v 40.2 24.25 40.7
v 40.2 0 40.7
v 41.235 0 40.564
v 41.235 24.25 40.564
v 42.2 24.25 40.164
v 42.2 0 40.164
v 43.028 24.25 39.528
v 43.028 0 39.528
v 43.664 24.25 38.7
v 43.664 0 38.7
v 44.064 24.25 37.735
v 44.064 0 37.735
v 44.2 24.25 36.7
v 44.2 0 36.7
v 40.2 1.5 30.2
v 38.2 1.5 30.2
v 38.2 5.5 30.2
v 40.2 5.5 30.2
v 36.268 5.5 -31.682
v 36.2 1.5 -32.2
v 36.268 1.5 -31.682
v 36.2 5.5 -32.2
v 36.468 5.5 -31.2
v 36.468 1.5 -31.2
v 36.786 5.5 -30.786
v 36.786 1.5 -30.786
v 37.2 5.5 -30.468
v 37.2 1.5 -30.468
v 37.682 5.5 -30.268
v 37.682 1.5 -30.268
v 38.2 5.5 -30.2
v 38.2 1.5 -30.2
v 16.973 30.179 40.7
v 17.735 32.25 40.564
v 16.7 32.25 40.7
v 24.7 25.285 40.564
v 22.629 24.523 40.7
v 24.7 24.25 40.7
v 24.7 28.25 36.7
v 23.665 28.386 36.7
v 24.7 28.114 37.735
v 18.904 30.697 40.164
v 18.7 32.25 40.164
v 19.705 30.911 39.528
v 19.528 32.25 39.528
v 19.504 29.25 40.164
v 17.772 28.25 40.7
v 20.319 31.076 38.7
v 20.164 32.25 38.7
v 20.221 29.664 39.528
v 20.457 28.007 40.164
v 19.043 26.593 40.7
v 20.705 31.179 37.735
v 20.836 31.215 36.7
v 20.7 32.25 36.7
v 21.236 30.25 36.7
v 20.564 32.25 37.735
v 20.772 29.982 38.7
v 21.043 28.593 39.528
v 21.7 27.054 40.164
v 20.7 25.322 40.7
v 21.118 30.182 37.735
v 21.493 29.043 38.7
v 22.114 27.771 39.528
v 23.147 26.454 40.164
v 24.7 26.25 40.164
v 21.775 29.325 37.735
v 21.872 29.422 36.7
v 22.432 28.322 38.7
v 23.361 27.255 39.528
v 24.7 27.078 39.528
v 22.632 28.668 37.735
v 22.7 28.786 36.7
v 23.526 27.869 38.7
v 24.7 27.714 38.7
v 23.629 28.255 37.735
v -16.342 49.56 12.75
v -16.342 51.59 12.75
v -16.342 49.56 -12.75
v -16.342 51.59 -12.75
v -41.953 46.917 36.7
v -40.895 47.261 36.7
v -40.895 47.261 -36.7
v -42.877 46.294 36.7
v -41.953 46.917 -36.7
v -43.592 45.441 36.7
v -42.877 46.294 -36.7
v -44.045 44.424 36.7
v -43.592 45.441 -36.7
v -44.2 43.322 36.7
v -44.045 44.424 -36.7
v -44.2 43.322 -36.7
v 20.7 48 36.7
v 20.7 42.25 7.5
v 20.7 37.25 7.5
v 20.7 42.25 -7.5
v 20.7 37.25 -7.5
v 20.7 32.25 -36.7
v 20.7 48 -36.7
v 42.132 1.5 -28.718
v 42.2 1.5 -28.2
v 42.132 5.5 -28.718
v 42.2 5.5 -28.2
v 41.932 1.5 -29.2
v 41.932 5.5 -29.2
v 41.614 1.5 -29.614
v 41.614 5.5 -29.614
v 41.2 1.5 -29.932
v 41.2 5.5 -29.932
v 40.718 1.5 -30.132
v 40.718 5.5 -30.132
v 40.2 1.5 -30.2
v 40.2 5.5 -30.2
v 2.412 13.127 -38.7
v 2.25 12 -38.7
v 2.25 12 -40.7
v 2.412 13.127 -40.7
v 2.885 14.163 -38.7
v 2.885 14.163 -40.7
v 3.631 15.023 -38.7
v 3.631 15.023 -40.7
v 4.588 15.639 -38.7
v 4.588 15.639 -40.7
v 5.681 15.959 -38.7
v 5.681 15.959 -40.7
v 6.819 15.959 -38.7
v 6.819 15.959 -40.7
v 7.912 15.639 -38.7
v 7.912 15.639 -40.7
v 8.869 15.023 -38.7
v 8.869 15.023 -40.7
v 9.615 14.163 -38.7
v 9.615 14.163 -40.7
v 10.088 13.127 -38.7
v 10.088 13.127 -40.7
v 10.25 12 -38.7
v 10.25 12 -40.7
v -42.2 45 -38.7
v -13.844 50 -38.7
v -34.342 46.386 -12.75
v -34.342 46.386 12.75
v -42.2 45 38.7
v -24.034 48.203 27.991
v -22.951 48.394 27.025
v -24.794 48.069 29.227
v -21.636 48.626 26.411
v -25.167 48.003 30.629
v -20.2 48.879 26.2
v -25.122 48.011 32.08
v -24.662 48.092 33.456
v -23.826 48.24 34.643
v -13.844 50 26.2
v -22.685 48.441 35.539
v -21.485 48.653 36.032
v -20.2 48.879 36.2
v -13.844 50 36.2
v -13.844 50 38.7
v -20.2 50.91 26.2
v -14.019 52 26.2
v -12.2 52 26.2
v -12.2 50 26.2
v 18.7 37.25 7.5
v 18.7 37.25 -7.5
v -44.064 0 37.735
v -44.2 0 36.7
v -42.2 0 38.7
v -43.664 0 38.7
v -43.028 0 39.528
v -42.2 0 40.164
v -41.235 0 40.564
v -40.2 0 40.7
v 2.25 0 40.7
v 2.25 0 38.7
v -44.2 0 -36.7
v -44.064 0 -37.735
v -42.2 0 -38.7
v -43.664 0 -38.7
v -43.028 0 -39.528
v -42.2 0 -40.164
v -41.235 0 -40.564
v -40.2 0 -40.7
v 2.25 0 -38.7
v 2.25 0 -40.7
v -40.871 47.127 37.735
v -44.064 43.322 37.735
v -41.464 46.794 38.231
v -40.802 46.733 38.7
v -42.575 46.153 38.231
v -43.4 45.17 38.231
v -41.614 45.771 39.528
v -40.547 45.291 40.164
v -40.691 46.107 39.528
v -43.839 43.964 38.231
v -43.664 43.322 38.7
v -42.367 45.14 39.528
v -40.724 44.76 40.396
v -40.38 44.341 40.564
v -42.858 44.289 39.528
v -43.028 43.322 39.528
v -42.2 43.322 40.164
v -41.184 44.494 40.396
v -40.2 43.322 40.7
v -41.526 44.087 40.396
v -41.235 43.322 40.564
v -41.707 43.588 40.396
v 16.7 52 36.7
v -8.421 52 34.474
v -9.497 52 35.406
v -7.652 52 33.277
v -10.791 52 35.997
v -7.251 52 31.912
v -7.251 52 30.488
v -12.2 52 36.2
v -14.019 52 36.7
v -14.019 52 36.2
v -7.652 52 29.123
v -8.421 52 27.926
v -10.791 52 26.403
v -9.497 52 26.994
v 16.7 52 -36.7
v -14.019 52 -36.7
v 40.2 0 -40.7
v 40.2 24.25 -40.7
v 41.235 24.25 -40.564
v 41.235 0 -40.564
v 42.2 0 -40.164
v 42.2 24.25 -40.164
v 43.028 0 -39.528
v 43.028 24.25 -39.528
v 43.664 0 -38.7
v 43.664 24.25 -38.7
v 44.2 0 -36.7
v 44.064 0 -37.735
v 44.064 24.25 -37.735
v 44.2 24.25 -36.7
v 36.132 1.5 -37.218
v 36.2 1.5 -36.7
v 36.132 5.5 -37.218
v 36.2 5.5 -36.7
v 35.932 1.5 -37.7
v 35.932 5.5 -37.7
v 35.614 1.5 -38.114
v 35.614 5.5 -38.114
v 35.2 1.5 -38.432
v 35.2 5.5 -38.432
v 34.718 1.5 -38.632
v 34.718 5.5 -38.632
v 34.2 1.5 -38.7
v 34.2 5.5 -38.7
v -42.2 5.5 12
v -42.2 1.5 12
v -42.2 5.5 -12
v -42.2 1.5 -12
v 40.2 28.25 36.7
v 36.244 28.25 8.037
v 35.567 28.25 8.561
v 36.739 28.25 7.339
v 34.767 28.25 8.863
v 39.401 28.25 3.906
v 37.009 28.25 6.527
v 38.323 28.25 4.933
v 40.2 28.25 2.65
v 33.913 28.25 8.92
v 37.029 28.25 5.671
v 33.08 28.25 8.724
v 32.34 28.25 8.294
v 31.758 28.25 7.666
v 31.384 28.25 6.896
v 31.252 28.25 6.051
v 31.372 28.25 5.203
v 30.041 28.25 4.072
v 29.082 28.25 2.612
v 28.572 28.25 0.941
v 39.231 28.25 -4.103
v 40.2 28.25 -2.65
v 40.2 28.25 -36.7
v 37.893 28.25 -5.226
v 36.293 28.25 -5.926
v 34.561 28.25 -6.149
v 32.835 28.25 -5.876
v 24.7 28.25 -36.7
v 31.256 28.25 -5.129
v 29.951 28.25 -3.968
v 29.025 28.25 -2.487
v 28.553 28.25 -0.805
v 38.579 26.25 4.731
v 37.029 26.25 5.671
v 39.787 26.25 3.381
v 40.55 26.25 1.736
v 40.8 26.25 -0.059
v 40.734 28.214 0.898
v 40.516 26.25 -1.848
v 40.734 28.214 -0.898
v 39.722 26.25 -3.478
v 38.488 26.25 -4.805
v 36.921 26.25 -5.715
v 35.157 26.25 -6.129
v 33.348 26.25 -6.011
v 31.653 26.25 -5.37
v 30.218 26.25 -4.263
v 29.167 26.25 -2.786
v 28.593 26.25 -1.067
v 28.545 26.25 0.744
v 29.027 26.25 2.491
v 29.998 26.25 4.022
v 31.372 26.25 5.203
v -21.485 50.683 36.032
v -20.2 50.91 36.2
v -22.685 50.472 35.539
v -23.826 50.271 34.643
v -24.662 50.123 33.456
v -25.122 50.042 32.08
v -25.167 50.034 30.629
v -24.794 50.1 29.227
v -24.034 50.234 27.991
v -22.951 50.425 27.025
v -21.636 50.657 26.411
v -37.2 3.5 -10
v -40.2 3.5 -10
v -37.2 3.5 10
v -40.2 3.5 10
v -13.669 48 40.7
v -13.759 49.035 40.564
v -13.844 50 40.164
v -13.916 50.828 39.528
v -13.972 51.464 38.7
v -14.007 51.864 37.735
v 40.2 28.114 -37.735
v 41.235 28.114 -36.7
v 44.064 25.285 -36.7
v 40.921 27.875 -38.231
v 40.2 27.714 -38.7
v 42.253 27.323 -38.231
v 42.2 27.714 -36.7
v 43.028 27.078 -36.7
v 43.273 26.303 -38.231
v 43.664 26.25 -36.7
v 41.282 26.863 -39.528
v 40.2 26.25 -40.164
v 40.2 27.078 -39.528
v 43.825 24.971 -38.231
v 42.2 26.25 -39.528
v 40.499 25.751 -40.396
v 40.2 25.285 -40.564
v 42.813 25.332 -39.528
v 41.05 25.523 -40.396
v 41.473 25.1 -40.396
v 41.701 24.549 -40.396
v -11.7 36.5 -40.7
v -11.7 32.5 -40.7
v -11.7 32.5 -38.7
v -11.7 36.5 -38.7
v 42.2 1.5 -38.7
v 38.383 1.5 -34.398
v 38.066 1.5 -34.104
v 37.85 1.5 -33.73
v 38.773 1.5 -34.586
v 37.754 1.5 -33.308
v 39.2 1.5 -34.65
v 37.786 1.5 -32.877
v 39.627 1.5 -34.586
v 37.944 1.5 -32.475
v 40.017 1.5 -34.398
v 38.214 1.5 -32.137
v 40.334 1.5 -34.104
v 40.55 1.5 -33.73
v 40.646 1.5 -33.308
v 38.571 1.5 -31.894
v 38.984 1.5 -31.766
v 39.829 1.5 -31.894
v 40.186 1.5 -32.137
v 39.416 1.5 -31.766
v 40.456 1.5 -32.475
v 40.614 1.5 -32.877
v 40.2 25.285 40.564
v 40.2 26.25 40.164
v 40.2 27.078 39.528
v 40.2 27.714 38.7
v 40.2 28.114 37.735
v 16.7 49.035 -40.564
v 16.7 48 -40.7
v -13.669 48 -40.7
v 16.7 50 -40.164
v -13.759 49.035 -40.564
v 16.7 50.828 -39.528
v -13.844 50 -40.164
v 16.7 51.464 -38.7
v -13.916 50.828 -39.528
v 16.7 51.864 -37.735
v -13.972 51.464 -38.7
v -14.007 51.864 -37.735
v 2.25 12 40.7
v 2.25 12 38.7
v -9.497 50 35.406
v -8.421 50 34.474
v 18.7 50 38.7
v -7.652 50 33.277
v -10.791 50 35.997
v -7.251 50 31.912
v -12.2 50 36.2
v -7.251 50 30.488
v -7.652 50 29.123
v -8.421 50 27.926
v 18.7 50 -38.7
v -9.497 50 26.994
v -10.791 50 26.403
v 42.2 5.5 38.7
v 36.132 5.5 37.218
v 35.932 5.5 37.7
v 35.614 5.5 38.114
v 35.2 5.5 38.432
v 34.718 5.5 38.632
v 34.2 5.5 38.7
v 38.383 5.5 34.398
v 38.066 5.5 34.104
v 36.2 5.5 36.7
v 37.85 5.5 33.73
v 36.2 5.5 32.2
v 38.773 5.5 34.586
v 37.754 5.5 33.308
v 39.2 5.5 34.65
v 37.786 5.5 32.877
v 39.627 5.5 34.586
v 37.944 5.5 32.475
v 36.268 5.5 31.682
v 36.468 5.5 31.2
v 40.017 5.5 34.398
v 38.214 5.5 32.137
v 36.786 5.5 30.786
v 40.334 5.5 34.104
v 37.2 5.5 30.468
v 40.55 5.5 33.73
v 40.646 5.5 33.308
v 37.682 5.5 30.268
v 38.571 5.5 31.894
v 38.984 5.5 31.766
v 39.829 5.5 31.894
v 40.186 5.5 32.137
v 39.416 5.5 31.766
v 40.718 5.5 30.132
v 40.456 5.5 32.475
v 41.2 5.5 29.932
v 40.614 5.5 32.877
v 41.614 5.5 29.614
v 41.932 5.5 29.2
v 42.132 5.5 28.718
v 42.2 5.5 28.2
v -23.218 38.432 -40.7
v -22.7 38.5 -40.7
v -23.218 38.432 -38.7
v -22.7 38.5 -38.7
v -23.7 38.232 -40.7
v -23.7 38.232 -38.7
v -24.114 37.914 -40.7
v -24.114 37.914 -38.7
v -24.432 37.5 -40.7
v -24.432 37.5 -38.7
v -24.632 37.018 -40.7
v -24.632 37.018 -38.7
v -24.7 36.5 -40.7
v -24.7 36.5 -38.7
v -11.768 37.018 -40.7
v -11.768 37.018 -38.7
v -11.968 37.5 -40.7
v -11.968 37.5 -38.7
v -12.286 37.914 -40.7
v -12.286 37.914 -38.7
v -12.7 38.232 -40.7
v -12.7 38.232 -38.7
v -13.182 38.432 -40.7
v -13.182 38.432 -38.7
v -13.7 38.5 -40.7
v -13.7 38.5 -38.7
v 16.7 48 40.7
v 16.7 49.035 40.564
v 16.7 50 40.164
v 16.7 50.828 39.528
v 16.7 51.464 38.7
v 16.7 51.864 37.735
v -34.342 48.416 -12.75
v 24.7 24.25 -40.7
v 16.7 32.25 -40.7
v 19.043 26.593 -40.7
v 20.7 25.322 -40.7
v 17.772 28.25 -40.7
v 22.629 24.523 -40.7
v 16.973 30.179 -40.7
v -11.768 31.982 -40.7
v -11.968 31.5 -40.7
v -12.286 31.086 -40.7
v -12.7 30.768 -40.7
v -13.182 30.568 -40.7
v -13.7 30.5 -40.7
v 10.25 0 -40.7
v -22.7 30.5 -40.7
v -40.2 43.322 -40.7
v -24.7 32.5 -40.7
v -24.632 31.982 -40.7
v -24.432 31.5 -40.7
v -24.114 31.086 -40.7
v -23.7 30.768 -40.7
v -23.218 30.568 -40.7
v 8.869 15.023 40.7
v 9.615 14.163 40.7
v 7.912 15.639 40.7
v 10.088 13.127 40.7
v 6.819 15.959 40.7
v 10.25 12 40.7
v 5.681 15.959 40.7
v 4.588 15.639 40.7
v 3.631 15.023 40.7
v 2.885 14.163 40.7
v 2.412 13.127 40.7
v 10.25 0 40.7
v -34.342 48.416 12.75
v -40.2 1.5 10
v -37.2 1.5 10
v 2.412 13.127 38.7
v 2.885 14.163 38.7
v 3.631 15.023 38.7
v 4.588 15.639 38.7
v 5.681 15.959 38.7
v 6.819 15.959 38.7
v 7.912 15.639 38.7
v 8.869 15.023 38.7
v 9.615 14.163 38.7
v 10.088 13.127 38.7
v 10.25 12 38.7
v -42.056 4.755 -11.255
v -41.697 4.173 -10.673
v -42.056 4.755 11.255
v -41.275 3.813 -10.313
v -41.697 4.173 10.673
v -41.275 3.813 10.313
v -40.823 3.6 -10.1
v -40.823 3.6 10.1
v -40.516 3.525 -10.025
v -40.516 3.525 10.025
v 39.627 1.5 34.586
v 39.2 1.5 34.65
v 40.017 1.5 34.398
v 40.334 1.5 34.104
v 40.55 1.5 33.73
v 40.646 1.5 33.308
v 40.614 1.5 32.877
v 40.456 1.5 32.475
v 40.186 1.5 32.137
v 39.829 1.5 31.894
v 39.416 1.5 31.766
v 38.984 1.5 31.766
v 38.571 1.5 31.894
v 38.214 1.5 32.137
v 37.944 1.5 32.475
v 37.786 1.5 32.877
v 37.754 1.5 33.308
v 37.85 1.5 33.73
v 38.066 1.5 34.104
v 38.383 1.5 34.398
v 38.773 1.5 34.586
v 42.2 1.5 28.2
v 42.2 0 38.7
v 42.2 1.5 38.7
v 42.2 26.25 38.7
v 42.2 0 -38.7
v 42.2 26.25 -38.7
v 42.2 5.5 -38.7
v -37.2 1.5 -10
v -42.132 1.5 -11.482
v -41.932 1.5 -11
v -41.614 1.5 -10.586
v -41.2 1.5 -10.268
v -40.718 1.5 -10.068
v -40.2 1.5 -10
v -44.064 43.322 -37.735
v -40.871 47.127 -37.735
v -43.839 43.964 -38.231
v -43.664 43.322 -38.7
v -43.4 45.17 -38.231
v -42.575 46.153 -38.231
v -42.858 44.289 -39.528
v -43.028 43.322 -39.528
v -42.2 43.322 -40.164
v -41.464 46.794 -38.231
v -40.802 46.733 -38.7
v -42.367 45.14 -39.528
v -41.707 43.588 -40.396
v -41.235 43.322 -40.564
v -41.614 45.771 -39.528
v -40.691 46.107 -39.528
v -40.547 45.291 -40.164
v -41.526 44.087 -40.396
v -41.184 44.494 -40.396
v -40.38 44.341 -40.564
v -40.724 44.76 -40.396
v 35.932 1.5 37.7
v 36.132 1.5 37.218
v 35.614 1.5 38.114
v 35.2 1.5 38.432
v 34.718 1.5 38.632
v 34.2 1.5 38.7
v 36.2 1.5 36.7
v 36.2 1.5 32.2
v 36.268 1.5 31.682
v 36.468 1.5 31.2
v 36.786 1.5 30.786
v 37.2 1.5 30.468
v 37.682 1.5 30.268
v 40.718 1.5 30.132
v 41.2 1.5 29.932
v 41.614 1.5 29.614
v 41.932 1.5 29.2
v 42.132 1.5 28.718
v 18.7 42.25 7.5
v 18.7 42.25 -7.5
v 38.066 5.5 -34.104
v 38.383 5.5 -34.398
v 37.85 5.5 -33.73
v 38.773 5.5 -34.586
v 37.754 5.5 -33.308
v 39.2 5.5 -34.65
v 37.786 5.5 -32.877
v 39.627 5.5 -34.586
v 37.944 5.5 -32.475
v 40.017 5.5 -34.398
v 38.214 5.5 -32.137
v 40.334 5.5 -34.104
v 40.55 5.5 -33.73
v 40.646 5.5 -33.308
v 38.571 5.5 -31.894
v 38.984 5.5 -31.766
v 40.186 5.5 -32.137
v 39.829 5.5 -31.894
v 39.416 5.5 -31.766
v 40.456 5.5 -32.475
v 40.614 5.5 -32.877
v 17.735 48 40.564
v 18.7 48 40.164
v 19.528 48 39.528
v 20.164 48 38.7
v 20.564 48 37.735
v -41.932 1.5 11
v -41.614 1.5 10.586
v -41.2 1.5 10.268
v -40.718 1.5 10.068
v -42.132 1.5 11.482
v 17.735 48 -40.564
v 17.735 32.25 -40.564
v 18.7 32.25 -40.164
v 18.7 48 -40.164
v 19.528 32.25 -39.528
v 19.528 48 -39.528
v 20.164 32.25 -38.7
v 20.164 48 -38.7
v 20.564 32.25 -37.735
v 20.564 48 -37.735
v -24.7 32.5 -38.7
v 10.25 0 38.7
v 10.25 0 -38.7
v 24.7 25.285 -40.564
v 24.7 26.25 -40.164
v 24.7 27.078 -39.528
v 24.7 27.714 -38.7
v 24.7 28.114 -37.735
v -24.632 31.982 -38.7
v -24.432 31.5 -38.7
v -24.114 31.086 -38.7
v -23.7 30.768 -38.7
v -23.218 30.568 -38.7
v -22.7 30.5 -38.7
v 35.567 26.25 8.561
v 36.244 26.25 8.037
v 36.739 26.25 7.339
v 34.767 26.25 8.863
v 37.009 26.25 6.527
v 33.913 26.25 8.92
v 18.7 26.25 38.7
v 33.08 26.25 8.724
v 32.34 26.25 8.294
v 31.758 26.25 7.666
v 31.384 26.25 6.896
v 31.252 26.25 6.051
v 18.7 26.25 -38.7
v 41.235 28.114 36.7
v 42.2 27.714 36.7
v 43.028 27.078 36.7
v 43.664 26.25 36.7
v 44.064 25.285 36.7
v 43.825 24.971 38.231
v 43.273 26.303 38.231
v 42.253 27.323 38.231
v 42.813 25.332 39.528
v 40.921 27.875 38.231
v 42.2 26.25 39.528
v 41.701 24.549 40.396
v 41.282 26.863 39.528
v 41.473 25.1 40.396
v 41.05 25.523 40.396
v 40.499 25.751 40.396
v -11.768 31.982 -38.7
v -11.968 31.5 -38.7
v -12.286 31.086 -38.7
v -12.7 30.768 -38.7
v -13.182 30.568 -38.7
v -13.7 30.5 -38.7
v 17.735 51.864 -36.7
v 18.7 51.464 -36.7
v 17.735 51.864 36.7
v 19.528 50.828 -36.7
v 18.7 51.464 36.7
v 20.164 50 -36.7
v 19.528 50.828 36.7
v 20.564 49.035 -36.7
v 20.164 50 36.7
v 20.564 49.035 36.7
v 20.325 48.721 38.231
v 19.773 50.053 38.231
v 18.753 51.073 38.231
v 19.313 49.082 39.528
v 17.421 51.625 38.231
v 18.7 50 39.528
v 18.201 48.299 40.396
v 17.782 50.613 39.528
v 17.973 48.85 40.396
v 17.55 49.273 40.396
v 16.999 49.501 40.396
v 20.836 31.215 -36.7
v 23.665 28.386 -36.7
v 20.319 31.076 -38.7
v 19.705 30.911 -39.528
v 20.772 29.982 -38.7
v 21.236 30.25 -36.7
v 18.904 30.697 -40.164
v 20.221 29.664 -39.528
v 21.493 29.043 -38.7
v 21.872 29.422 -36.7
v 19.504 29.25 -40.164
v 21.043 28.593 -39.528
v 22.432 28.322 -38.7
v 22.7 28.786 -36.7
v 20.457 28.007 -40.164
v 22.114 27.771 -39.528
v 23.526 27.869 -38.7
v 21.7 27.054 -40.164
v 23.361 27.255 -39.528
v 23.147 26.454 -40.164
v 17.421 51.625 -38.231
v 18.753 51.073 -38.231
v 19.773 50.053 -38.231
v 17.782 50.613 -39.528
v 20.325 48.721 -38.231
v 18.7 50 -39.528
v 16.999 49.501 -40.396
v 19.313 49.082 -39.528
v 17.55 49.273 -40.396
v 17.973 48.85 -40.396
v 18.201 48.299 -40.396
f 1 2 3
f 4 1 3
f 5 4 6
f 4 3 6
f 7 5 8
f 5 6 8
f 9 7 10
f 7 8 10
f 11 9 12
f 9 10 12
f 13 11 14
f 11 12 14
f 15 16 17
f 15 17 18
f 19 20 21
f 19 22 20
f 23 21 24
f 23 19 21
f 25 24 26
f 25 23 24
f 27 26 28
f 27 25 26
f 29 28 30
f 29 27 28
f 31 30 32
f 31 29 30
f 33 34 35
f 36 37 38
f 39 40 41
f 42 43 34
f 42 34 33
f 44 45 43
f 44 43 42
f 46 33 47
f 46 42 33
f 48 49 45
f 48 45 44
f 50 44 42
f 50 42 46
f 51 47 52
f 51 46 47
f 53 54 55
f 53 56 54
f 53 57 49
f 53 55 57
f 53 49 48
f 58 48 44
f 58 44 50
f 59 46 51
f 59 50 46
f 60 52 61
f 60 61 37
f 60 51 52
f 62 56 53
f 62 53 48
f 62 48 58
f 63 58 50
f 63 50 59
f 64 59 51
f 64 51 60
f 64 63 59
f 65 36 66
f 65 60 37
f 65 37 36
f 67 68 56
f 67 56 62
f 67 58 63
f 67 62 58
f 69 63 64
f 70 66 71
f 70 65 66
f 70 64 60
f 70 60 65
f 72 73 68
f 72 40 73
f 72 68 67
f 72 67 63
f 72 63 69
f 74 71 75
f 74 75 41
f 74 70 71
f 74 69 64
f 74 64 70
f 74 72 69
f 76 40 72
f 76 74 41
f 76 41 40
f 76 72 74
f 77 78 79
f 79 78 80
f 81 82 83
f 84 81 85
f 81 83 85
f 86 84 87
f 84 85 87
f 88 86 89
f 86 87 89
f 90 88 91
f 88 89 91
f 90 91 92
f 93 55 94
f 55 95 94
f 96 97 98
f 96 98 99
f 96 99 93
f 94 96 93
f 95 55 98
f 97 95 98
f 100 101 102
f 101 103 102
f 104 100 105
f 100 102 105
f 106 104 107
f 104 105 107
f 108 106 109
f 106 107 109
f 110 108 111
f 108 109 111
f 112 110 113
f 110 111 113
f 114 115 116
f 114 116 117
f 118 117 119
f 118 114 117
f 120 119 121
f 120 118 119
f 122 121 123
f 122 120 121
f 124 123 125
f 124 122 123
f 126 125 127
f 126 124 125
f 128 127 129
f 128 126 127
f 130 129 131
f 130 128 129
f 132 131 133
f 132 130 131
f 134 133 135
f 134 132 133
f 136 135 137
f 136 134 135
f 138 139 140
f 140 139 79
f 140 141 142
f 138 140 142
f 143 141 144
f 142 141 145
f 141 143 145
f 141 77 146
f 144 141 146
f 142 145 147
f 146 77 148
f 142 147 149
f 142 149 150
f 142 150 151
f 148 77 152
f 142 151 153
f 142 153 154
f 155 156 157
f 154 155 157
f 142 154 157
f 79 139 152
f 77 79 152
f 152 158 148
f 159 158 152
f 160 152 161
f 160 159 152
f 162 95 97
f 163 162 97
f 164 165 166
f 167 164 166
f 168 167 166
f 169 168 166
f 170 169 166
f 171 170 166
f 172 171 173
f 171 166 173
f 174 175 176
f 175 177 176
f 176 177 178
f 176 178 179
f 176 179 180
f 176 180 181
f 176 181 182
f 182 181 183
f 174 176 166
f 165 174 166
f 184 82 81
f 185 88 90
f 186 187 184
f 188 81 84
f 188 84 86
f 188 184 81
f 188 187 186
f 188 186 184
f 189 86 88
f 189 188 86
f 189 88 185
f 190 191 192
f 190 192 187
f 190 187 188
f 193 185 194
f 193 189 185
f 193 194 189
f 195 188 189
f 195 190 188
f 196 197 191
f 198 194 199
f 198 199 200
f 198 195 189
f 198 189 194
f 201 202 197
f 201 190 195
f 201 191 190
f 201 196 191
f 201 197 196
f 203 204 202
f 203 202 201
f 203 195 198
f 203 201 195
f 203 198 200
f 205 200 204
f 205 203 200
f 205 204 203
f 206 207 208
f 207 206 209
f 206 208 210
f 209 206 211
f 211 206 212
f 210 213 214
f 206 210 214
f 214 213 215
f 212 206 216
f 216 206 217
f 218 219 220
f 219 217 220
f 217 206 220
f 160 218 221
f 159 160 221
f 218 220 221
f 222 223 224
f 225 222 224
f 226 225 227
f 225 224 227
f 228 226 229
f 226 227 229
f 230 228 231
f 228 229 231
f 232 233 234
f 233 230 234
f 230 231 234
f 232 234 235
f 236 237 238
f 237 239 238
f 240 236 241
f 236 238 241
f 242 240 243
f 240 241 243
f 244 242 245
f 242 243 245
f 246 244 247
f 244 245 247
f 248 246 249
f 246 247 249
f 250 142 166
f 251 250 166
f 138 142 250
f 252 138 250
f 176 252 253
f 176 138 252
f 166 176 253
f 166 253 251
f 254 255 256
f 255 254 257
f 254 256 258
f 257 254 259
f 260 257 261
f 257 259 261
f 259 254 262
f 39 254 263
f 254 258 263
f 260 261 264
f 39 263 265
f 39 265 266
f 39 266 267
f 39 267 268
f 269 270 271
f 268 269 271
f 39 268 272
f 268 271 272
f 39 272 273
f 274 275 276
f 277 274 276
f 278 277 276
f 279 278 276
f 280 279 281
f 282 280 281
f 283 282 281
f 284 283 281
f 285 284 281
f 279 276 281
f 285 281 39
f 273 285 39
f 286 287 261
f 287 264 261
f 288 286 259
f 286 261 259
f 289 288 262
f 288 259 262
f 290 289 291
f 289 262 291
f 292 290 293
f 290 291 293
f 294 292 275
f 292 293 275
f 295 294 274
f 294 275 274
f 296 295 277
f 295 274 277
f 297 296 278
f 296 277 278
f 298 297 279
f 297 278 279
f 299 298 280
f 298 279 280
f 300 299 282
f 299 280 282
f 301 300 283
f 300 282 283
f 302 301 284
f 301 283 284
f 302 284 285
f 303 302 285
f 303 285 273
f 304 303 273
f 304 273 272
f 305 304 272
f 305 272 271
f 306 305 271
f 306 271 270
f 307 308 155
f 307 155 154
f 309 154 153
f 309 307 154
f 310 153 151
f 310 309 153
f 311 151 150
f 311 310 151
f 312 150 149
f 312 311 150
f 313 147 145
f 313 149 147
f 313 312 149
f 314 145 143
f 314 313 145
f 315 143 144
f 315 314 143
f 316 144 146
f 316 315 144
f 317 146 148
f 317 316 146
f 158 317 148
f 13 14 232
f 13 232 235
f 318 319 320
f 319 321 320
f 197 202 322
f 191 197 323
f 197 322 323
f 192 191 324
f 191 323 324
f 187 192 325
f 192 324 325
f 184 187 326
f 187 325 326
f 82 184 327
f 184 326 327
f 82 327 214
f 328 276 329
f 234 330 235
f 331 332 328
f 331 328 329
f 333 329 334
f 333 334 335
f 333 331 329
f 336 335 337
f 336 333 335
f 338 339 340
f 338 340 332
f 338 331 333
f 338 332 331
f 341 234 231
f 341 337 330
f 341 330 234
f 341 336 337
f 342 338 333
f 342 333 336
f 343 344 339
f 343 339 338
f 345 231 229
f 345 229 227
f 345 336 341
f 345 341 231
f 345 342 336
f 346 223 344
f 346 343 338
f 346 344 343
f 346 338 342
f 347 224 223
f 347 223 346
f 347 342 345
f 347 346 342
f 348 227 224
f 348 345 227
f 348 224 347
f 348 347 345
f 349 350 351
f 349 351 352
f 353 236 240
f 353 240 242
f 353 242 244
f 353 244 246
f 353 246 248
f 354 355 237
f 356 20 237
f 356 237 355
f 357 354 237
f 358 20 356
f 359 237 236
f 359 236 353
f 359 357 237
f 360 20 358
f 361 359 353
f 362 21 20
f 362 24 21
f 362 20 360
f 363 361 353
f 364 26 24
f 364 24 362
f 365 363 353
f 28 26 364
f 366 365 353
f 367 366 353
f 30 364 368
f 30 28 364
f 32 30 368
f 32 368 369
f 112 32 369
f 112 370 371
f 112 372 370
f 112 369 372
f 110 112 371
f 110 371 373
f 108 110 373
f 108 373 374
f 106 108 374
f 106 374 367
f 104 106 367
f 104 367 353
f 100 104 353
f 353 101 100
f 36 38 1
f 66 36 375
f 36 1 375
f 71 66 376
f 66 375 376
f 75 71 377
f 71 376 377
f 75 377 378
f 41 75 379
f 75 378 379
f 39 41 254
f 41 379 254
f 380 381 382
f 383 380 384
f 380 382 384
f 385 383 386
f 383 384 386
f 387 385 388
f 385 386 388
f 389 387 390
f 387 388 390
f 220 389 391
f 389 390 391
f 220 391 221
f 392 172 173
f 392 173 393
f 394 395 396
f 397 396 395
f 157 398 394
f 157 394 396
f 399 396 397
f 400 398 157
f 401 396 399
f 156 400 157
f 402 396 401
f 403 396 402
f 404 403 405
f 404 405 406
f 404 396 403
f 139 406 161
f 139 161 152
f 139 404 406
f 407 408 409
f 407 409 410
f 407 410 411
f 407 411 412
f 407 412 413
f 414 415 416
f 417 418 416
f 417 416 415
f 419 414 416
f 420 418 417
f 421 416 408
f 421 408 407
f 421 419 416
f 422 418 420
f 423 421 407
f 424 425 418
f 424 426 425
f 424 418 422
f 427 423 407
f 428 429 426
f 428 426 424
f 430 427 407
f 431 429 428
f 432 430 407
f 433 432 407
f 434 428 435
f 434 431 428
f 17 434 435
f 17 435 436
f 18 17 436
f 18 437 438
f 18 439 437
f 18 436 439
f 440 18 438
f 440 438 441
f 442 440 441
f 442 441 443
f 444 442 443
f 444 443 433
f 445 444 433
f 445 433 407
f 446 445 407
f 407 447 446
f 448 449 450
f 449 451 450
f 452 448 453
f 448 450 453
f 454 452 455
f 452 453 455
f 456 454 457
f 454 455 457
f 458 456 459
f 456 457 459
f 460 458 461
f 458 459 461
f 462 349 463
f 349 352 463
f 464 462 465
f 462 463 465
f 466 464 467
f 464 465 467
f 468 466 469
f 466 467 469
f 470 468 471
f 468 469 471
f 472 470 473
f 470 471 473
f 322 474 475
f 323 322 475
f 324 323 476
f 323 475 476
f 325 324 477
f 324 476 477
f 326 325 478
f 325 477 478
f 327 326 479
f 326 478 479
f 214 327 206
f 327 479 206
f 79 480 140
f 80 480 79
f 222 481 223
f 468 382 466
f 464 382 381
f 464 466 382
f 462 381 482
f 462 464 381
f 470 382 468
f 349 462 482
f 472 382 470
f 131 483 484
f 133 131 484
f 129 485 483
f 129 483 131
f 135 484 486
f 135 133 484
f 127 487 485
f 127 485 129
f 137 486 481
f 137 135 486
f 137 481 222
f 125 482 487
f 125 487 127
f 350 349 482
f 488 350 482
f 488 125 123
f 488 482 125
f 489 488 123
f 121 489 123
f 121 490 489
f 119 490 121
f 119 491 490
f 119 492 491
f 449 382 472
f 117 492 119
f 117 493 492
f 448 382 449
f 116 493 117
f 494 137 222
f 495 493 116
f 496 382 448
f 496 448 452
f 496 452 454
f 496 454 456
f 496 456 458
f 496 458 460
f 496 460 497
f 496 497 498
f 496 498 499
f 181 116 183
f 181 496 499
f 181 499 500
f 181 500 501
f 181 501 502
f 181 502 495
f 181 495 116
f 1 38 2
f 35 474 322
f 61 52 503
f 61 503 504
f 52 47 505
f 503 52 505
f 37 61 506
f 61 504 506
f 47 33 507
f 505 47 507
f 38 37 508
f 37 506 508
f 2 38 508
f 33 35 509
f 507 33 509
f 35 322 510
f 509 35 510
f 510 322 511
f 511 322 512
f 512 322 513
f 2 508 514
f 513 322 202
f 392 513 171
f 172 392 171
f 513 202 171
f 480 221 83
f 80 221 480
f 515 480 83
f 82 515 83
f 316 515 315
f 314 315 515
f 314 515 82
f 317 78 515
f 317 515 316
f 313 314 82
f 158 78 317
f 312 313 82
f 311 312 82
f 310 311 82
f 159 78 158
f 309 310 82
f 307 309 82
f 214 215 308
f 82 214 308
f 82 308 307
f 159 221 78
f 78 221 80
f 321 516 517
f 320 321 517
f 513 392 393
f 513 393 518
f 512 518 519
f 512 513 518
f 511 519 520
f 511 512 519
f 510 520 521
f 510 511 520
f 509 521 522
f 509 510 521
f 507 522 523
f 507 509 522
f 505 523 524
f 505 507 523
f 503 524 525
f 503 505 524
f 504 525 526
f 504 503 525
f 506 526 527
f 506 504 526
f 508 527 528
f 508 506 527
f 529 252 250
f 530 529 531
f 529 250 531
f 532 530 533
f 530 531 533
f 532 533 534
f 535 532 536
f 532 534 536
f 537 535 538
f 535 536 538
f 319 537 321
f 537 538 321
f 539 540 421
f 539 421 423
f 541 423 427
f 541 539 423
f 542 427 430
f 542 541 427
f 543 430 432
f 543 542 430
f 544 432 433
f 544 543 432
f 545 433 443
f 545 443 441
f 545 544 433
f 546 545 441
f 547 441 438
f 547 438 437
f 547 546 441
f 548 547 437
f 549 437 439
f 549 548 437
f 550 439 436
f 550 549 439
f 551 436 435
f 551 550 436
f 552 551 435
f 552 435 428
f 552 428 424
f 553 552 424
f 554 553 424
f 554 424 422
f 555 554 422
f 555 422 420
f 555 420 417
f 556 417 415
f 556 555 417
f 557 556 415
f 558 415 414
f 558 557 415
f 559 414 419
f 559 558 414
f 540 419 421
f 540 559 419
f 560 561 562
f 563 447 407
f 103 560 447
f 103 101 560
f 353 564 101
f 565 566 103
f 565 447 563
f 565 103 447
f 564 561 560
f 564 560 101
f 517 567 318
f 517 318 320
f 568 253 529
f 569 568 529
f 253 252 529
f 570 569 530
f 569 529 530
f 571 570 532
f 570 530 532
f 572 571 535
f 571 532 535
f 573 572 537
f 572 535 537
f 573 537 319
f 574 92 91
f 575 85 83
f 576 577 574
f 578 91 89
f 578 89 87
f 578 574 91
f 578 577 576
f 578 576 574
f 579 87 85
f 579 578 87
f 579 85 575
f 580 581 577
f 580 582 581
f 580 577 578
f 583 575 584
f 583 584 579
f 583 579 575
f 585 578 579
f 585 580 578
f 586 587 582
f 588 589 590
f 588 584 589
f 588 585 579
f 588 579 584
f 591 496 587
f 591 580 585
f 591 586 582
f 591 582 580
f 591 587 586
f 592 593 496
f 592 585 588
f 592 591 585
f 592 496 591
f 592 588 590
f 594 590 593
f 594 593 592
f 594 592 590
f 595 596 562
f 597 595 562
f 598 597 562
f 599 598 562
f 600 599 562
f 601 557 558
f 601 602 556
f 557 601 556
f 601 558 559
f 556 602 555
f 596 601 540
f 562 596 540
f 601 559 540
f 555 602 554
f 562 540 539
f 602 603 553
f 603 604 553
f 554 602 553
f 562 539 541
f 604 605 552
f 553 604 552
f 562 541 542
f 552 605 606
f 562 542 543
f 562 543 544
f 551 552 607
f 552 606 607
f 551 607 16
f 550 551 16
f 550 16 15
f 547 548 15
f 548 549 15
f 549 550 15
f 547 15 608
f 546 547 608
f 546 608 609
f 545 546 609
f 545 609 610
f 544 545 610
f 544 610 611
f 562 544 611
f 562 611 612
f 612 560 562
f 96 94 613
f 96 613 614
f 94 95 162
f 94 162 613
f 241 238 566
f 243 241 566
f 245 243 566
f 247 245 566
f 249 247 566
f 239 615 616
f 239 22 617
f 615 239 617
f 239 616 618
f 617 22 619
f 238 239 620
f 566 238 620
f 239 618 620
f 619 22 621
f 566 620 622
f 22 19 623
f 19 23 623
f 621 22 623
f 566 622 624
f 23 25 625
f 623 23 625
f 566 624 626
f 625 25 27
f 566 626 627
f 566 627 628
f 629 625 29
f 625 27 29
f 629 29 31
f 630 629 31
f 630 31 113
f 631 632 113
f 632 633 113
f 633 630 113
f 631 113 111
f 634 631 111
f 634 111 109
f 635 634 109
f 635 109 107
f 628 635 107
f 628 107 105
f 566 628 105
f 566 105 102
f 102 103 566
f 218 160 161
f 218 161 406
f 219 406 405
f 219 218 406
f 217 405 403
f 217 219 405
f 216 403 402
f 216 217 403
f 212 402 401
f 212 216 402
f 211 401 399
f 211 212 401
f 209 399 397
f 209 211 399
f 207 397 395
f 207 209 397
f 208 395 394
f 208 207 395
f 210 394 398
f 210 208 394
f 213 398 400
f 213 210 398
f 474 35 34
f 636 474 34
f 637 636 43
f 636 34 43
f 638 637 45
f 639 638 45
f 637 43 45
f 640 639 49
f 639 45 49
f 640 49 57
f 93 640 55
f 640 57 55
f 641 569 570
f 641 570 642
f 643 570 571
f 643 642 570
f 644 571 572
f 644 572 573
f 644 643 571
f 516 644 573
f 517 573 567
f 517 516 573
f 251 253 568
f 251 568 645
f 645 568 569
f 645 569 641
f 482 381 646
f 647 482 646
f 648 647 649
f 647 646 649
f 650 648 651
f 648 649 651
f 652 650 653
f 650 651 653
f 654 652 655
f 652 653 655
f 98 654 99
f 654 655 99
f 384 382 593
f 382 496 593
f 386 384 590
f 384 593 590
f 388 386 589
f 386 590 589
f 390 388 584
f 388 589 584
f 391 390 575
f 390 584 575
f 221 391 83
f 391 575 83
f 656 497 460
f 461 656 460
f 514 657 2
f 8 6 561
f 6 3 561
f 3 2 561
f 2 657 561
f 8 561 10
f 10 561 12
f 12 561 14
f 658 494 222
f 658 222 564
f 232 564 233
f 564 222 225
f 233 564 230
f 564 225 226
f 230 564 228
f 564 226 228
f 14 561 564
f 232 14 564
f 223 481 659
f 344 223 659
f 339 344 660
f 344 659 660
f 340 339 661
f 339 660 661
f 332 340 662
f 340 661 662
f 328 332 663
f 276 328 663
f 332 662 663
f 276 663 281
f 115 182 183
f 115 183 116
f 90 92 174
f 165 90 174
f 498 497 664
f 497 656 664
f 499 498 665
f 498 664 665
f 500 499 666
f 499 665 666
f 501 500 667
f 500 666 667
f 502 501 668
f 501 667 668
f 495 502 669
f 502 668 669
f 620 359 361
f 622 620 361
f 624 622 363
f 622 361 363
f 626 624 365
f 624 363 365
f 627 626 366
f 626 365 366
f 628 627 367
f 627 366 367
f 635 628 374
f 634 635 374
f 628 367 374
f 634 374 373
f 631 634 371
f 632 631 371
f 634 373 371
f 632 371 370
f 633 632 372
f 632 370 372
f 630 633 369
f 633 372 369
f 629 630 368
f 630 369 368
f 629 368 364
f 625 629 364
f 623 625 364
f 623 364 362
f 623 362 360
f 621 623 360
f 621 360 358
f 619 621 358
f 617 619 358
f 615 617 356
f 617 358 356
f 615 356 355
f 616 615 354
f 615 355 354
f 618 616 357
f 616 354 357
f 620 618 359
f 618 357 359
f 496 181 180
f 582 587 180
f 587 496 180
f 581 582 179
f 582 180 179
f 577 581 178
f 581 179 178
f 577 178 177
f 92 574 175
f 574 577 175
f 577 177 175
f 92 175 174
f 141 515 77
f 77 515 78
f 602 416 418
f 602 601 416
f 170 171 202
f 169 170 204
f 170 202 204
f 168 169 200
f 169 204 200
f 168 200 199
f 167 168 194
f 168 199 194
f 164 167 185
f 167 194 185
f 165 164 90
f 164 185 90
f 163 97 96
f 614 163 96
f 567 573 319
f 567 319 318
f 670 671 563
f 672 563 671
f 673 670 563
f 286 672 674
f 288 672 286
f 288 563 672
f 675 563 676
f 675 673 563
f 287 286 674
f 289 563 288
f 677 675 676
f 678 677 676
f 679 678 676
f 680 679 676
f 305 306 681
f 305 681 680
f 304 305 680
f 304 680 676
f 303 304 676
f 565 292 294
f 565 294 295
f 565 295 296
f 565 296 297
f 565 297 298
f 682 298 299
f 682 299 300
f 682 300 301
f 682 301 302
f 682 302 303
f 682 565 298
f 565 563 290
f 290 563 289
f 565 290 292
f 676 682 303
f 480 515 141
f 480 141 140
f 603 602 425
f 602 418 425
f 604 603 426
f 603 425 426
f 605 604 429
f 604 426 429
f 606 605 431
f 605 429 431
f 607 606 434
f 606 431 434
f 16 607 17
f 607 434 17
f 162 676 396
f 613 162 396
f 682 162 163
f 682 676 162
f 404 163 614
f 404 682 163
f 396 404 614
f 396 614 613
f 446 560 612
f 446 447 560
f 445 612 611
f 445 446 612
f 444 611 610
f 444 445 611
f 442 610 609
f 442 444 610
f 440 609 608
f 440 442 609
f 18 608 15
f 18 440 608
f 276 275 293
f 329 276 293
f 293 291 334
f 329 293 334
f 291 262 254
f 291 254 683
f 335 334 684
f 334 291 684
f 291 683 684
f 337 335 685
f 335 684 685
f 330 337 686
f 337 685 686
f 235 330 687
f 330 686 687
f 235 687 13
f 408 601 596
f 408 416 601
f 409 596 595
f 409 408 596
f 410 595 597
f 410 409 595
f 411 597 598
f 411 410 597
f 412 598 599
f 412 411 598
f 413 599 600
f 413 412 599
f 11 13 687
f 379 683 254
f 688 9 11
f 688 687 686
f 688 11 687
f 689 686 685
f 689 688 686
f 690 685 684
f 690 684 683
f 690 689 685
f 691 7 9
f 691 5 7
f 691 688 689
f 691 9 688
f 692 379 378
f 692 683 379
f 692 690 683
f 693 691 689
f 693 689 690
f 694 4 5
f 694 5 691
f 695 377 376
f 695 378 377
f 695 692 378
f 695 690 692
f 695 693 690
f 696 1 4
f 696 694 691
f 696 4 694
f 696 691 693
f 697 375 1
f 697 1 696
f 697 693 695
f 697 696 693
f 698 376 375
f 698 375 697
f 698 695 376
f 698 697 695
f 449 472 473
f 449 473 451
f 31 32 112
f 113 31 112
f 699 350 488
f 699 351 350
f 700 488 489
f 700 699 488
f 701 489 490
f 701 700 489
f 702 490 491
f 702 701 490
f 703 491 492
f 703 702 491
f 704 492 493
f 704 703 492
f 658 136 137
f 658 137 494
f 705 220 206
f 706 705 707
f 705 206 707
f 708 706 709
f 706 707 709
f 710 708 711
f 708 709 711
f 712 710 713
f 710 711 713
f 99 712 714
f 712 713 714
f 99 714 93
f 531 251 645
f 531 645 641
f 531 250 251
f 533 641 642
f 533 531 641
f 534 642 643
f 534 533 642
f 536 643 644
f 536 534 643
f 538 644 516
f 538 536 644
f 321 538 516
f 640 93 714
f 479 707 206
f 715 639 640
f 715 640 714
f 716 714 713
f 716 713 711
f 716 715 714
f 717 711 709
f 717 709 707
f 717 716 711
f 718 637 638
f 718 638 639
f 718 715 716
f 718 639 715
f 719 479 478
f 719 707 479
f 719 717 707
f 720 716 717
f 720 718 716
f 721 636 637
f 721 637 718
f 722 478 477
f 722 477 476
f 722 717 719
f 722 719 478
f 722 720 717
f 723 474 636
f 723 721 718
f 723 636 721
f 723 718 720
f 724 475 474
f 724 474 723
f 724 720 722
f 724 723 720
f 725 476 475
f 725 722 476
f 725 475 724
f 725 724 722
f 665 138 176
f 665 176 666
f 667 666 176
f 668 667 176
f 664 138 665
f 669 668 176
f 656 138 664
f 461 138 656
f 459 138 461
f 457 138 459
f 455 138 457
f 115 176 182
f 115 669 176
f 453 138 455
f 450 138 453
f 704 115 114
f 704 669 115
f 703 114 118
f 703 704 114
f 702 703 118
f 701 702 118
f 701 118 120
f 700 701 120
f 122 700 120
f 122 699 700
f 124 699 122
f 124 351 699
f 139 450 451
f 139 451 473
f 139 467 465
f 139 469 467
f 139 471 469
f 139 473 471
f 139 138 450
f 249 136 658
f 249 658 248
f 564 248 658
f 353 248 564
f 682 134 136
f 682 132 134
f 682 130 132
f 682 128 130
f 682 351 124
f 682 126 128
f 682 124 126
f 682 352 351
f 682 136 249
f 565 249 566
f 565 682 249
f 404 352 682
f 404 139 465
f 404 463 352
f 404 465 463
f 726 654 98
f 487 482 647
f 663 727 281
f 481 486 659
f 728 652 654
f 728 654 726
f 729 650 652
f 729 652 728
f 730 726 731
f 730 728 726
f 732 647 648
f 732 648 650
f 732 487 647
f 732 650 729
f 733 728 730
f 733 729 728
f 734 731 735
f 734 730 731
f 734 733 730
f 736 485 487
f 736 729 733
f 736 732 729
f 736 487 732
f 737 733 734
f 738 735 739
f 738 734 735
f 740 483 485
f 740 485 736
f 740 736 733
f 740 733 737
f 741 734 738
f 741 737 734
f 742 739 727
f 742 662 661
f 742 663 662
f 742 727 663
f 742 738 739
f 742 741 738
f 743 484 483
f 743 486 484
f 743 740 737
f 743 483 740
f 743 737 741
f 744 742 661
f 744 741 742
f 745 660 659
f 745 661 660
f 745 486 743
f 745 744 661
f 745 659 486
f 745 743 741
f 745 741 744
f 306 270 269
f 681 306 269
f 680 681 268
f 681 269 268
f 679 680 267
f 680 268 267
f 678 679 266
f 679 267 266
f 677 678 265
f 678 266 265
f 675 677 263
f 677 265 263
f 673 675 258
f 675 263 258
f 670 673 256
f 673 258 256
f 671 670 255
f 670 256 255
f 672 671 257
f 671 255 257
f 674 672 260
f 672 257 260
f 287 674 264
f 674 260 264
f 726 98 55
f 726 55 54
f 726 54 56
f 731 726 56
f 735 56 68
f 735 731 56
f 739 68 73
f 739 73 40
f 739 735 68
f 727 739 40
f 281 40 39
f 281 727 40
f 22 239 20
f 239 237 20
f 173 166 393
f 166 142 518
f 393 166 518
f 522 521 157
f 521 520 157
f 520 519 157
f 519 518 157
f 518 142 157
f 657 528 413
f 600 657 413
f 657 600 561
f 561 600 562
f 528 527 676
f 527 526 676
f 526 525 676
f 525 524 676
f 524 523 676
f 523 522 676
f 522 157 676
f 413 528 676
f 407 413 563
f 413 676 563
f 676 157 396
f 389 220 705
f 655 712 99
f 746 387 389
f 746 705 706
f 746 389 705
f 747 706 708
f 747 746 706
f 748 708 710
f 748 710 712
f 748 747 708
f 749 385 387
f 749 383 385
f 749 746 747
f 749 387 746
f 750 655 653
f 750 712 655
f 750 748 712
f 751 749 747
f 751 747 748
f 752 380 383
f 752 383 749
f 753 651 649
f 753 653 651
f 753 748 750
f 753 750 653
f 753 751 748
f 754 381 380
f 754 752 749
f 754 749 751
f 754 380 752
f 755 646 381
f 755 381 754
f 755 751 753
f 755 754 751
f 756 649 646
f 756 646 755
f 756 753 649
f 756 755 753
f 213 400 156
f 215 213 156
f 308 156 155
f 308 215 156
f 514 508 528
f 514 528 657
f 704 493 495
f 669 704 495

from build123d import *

# Parameters (mm, degrees)
BOSS_EXTRUDE1_DEPTH      = 38.7
BOSS_EXTRUDE1_DEPTH_BACK = 38.7
CHAMFER1_SIZE            = 5
CHAMFER1_SIZE2           = 28.356409098
SHELL1_T                 = 2
FILLET2_R                = 4
BOSS_EXTRUDE2_START      = -1.5
SKETCH2_W                = 6
SKETCH2_H                = 2.5
SKETCH2_H_2              = 6
SKETCH2_R                = 1.45
BOSS_EXTRUDE2_DEPTH      = 4
FILLET3_R                = 2
CUT_EXTRUDE1_REACH       = 68.394
SKETCH3_R                = 6.15
SKETCH3_R_2              = 2.9
BOSS_EXTRUDE3_START      = -1.5
SKETCH4_W                = 5
SKETCH4_H                = 20
BOSS_EXTRUDE3_DEPTH      = 2
FILLET4_R                = 2
CUT_EXTRUDE2_REACH       = 94.588
SKETCH5_W                = 15
SKETCH5_H                = 5
CUT_EXTRUDE3_DEPTH       = 107.224291049
CUT_EXTRUDE4_REACH       = 92.819
SKETCH7_W                = 18
SKETCH7_H                = 25.5
CUT_EXTRUDE5_REACH       = 81.462
CUT_EXTRUDE6_REACH       = 108.224
SKETCH10_W               = 13
SKETCH10_H               = 8
FILLET5_R                = 2


with BuildPart() as part:
    # Sketch1 → Boss-Extrude1 (new, two sides: drawn at the far end of the back side and taken through both)
    with BuildSketch(Plane.XY.offset(-BOSS_EXTRUDE1_DEPTH_BACK)):
        Polygon((-42.2, 0), (42.2, 0), (42.2, 26.25), (18.7, 26.25), (18.7, 50), (-42.2, 50), align=None)
    extrude(amount=BOSS_EXTRUDE1_DEPTH + BOSS_EXTRUDE1_DEPTH_BACK)

    # Chamfer1
    chamfer1_edges = [part.edges().sort_by_distance(p)[0] for p in [
        (-42.2, 50, 0),
    ]]
    chamfer1_side = [part.faces().sort_by_distance(p)[0] for p in [
        (-42.2, 25, 0),
    ]]
    chamfer(chamfer1_edges, length=CHAMFER1_SIZE, length2=CHAMFER1_SIZE2, reference=chamfer1_side[0])

    # Shell1
    shell1_openings = [part.faces().sort_by_distance(p)[0] for p in [
        (0, 0, 0),
    ]]
    offset(amount=SHELL1_T, openings=shell1_openings, kind=Kind.INTERSECTION)

    # Fillet2
    # the kernel refuses this fillet: 4 mm, written as the material it adds along each edge
    with BuildSketch(Plane(origin=(20.7, 28.25, -40.7), x_dir=(0, 1, 0), z_dir=(0, 0, 1))) as fillet2_piece_1:
        with BuildLine():
            CenterArc((FILLET2_R, -FILLET2_R), FILLET2_R, 90, 90)
            Line((0, -FILLET2_R), (0, 0))
            Line((0, 0), (FILLET2_R, 0))
        make_face()
    extrude(amount=81.4)
    # the kernel refuses this fillet: 4 mm, written as the material it takes off along each edge
    with BuildSketch(Plane(origin=(-40.2, 43.321800738, 36.7), x_dir=(-0.1736481776669273, 0.9848077530122087, 0), z_dir=(0, 0, 1))) as fillet2_2_piece_1_section:
        Polygon((0, 0), (FILLET2_R, 0), (FILLET2_R, FILLET2_R * 0.839099631177), (FILLET2_R * 0.173648177667, FILLET2_R * 0.984807753012), align=None)
    fillet2_2_piece_1 = extrude(amount=FILLET2_R, mode=Mode.PRIVATE)
    fillet2_2_piece_1 = fillet2_2_piece_1 - Plane(origin=(-40.2, 43.321800738, 36.7), x_dir=(0.766044443118977, -0.6427876096865405, 0), z_dir=(0, 0, 1)) * Sphere(FILLET2_R, mode=Mode.PRIVATE)
    add(fillet2_2_piece_1, mode=Mode.SUBTRACT)
    with BuildSketch(Plane(origin=(-40.2, 43.321800738, -36.7), x_dir=(-0.1736481776669273, 0.9848077530122087, 0), z_dir=(0, 0, -1))) as fillet2_2_piece_2_section:
        Polygon((0, 0), (FILLET2_R, 0), (FILLET2_R, -FILLET2_R * 0.839099631177), (FILLET2_R * 0.173648177667, -FILLET2_R * 0.984807753012), align=None)
    fillet2_2_piece_2 = extrude(amount=FILLET2_R, mode=Mode.PRIVATE)
    fillet2_2_piece_2 = fillet2_2_piece_2 - Plane(origin=(-40.2, 43.321800738, -36.7), x_dir=(0.766044443118977, -0.6427876096865405, 0), z_dir=(0, 0, -1)) * Sphere(FILLET2_R, mode=Mode.PRIVATE)
    add(fillet2_2_piece_2, mode=Mode.SUBTRACT)
    with BuildSketch(Plane(origin=(20.7, 52, 50.7), x_dir=(0, -1, 0), z_dir=(0, 0, -1)), Plane(origin=(44.2, 28.25, 50.7), x_dir=(0, -1, 0), z_dir=(0, 0, -1))) as fillet2_2_piece_3:
        with BuildLine():
            CenterArc((FILLET2_R, FILLET2_R), FILLET2_R, 180, 90)
            Line((0, FILLET2_R), (0, 0))
            Line((0, 0), (FILLET2_R, 0))
        make_face()
    extrude(amount=101.4, mode=Mode.SUBTRACT)
    with BuildSketch(Plane(origin=(44.2, 38.25, -40.7), x_dir=(0, 0, 1), z_dir=(0, -1, 0))) as fillet2_2_piece_4:
        with BuildLine():
            CenterArc((FILLET2_R, FILLET2_R), FILLET2_R, 180, 90)
            Line((0, FILLET2_R), (0, 0))
            Line((0, 0), (FILLET2_R, 0))
        make_face()
    extrude(amount=48.25, mode=Mode.SUBTRACT)
    with BuildSketch(Plane(origin=(44.2, -10, 40.7), x_dir=(-1, 0, 0), z_dir=(0, 1, 0))) as fillet2_2_piece_5:
        with BuildLine():
            CenterArc((FILLET2_R, -FILLET2_R), FILLET2_R, 90, 90)
            Line((0, -FILLET2_R), (0, 0))
            Line((0, 0), (FILLET2_R, 0))
        make_face()
    extrude(amount=48.25, mode=Mode.SUBTRACT)
    with BuildSketch(Plane(origin=(30.7, 52, 40.7), x_dir=(0, -1, 0), z_dir=(-1, 0, 0)), Plane(origin=(-24.018568229, 52, -40.7), x_dir=(0, -1, 0), z_dir=(1, 0, 0))) as fillet2_2_piece_6:
        with BuildLine():
            CenterArc((FILLET2_R, -FILLET2_R), FILLET2_R, 90, 90)
            Line((0, -FILLET2_R), (0, 0))
            Line((0, 0), (FILLET2_R, 0))
        make_face()
    extrude(amount=54.718568229, mode=Mode.SUBTRACT)
    with BuildSketch(Plane(origin=(-44.2, 43.321800738, 40.7), x_dir=(0, 0, -1), z_dir=(0, -1, 0)), Plane(origin=(-44.2, -10, -40.7), x_dir=(0, 0, 1), z_dir=(0, 1, 0))) as fillet2_2_piece_7:
        with BuildLine():
            CenterArc((FILLET2_R, FILLET2_R), FILLET2_R, 180, 90)
            Line((0, FILLET2_R), (0, 0))
            Line((0, 0), (FILLET2_R, 0))
        make_face()
    extrude(amount=53.321800738, mode=Mode.SUBTRACT)
    with BuildSketch(Plane(origin=(-4.170490699, 53.736481777, 40.7), x_dir=(0.17364817766692728, -0.9848077530122086, 0), z_dir=(-0.9848077530122087, -0.1736481776669273, 0)), Plane(origin=(-40.894592711, 47.26103175, -40.7), x_dir=(0.1736481776669273, -0.9848077530122087, 1.77635683940025e-15), z_dir=(0.9848077530122087, 0.1736481776669273, 0))) as fillet2_2_piece_8:
        with BuildLine():
            CenterArc((FILLET2_R, -FILLET2_R), FILLET2_R, 90, 90)
            Line((0, -FILLET2_R), (0, 0))
            Line((0, 0), (FILLET2_R, 0))
        make_face()
    extrude(amount=37.29063048, mode=Mode.SUBTRACT)
    with BuildSketch(Plane(origin=(-44.2, 46.678199262, -36.7), x_dir=(0, -1, 0), z_dir=(0, 0, 1))) as fillet2_2_piece_9:
        with BuildLine():
            CenterArc((FILLET2_R * 0.839099631177, FILLET2_R), FILLET2_R, 190, 80)
            Line((-FILLET2_R * 0.145708121835, FILLET2_R * 0.826351822333), (0, 0))
            Line((0, 0), (FILLET2_R * 0.839099631177, 0))
        make_face()
    extrude(amount=73.4, mode=Mode.SUBTRACT)
    # the kernel refuses this fillet: 4 mm, written as the material it takes off along each edge
    with BuildSketch(Plane(origin=(16.7, 48, -36.7), x_dir=(1, 0, 0), z_dir=(0, 0, -1))) as fillet2_3_piece_1_section:
        Polygon((0, 0), (FILLET2_R, 0), (FILLET2_R, -FILLET2_R), (0, -FILLET2_R), align=None)
    fillet2_3_piece_1 = extrude(amount=FILLET2_R, mode=Mode.PRIVATE)
    fillet2_3_piece_1 = fillet2_3_piece_1 - Plane(origin=(16.7, 48, -36.7), x_dir=(-0.7071067811865475, -0.7071067811865476, 0), z_dir=(0, 0, -1)) * Sphere(FILLET2_R, mode=Mode.PRIVATE)
    add(fillet2_3_piece_1, mode=Mode.SUBTRACT)
    with BuildSketch(Plane(origin=(16.7, 48, 36.7), x_dir=(1, 0, 0), z_dir=(0, 0, 1))) as fillet2_3_piece_2_section:
        Polygon((0, 0), (FILLET2_R, 0), (FILLET2_R, FILLET2_R), (0, FILLET2_R), align=None)
    fillet2_3_piece_2 = extrude(amount=FILLET2_R, mode=Mode.PRIVATE)
    fillet2_3_piece_2 = fillet2_3_piece_2 - Plane(origin=(16.7, 48, 36.7), x_dir=(-0.7071067811865475, -0.7071067811865476, 0), z_dir=(0, 0, 1)) * Sphere(FILLET2_R, mode=Mode.PRIVATE)
    add(fillet2_3_piece_2, mode=Mode.SUBTRACT)
    with BuildSketch(Plane(origin=(40.2, 24.25, 36.7), x_dir=(0, 1, 0), z_dir=(0, 0, 1))) as fillet2_3_piece_3_section:
        Polygon((0, 0), (FILLET2_R, 0), (FILLET2_R, -FILLET2_R), (0, -FILLET2_R), align=None)
    fillet2_3_piece_3 = extrude(amount=FILLET2_R, mode=Mode.PRIVATE)
    fillet2_3_piece_3 = fillet2_3_piece_3 - Plane(origin=(40.2, 24.25, 36.7), x_dir=(-0.7071067811865475, -0.7071067811865476, 0), z_dir=(0, 0, 1)) * Sphere(FILLET2_R, mode=Mode.PRIVATE)
    add(fillet2_3_piece_3, mode=Mode.SUBTRACT)
    with BuildSketch(Plane(origin=(40.2, 24.25, -36.7), x_dir=(0, 1, 0), z_dir=(0, 0, -1))) as fillet2_3_piece_4_section:
        Polygon((0, 0), (FILLET2_R, 0), (FILLET2_R, FILLET2_R), (0, FILLET2_R), align=None)
    fillet2_3_piece_4 = extrude(amount=FILLET2_R, mode=Mode.PRIVATE)
    fillet2_3_piece_4 = fillet2_3_piece_4 - Plane(origin=(40.2, 24.25, -36.7), x_dir=(-0.7071067811865475, -0.7071067811865476, 0), z_dir=(0, 0, -1)) * Sphere(FILLET2_R, mode=Mode.PRIVATE)
    add(fillet2_3_piece_4, mode=Mode.SUBTRACT)
    with BuildSketch(Plane(origin=(24.7, 28.25, -40.7), x_dir=(0, -1, 0), z_dir=(1, 0, 0)), Plane(origin=(40.2, 28.25, 40.7), x_dir=(0, -1, 0), z_dir=(-1, 0, 0))) as fillet2_3_piece_5:
        with BuildLine():
            CenterArc((FILLET2_R, -FILLET2_R), FILLET2_R, 90, 90)
            Line((0, -FILLET2_R), (0, 0))
            Line((0, 0), (FILLET2_R, 0))
        make_face()
    extrude(amount=15.5, mode=Mode.SUBTRACT)
    with BuildSketch(Plane(origin=(20.7, 32.25, 40.7), x_dir=(-1, 0, 0), z_dir=(0, 1, 0)), Plane(origin=(20.7, 48, -40.7), x_dir=(-1, 0, 0), z_dir=(0, -1, 0))) as fillet2_3_piece_6:
        with BuildLine():
            CenterArc((FILLET2_R, -FILLET2_R), FILLET2_R, 90, 90)
            Line((0, -FILLET2_R), (0, 0))
            Line((0, 0), (FILLET2_R, 0))
        make_face()
    extrude(amount=15.75, mode=Mode.SUBTRACT)
    with BuildSketch(Plane(origin=(24.7, 32.25, -40.7), x_dir=(-1, 0, 0), z_dir=(0, 1, 0))) as fillet2_3_piece_7:
        with BuildLine():
            CenterArc((4 + FILLET2_R, FILLET2_R), FILLET2_R, 180, 90)
            Line((4, FILLET2_R), (4, 0))
            Line((4, 0), (4 + FILLET2_R, 0))
        make_face()
    revolve(axis=Axis((24.7, 32.25, -40.7), (0, 0, 1)), revolution_arc=90, mode=Mode.SUBTRACT)
    with BuildSketch(Plane(origin=(24.7, 32.25, 40.7), x_dir=(-1, 0, 0), z_dir=(0, 1, 0))) as fillet2_3_piece_8:
        with BuildLine():
            CenterArc((4 + FILLET2_R, -FILLET2_R), FILLET2_R, 90, 90)
            Line((4, -FILLET2_R), (4, 0))
            Line((4, 0), (4 + FILLET2_R, 0))
        make_face()
    revolve(axis=Axis((24.7, 32.25, 40.7), (0, 0, 1)), revolution_arc=90, mode=Mode.SUBTRACT)

    # Sketch2 → Boss-Extrude2 (add)
    # profile 1 of 2: a face of its own
    with BuildSketch(Plane.XZ.offset(BOSS_EXTRUDE2_START)):
        with Locations((39.2, -37.45)):
            Rectangle(SKETCH2_W, SKETCH2_H)
    # profile 2 of 2: a face of its own
    with BuildSketch(Plane.XZ.offset(BOSS_EXTRUDE2_START)):
        with Locations((39.2, -33.2)):
            Rectangle(SKETCH2_W, SKETCH2_H_2)
        with Locations(Location((39.2, -33.2, 0), (0, 0, 270))):
            Circle(SKETCH2_R, mode=Mode.SUBTRACT)
    boss_extrude2 = extrude(amount=-BOSS_EXTRUDE2_DEPTH)

    # Mirror1: Boss-Extrude2 across plane
    add(boss_extrude2.mirror(Plane.XY))

    # Fillet3
    fillet3_edges = [part.edges().sort_by_distance(p)[0] for p in [
        (42.2, 3.5, -30.2),
        (36.2, 3.5, -38.7),
        (36.2, 3.5, -30.2),
        (42.2, 3.5, 30.2),
        (36.2, 3.5, 30.2),
        (36.2, 3.5, 38.7),
    ]]
    fillet(fillet3_edges, radius=FILLET3_R)

    # Sketch3 → Cut-Extrude1 (cut, up to next)
    with BuildSketch(Plane(origin=(0, 28.25, 0), x_dir=(1, 0, 0), z_dir=(0, 1, 0)), mode=Mode.PRIVATE) as cut_extrude1_sk1:
        with Locations((34.65, 0)):
            Circle(SKETCH3_R)
    cut_extrude1_tool1 = extrude(cut_extrude1_sk1.sketch, amount=-CUT_EXTRUDE1_REACH, mode=Mode.PRIVATE) & part.part
    # Sketch3 → Cut-Extrude1 (cut, up to next)
    with BuildSketch(Plane(origin=(0, 28.25, 0), x_dir=(1, 0, 0), z_dir=(0, 1, 0)), mode=Mode.PRIVATE) as cut_extrude1_sk2:
        with Locations((34.151698836, -6.029444083)):
            Circle(SKETCH3_R_2)
    cut_extrude1_tool2 = extrude(cut_extrude1_sk2.sketch, amount=-CUT_EXTRUDE1_REACH, mode=Mode.PRIVATE) & part.part
    add(cut_extrude1_tool1.solids().sort_by_distance((34.65, 28.25, 0))[0], mode=Mode.SUBTRACT)
    add(cut_extrude1_tool2.solids().sort_by_distance((34.151699, 28.25, 6.029444))[0], mode=Mode.SUBTRACT)

    # Sketch4 → Boss-Extrude3 (add)
    with BuildSketch(Plane.XZ.offset(BOSS_EXTRUDE3_START)):
        with Locations((-39.7, 0)):
            Rectangle(SKETCH4_W, SKETCH4_H)
    extrude(amount=-BOSS_EXTRUDE3_DEPTH)

    # Fillet4
    fillet4_edges = [part.edges().sort_by_distance(p)[0] for p in [
        (-42.2, 3.5, 0),
        (-42.2, 2.5, -10),
        (-42.2, 2.5, 10),
    ]]
    fillet(fillet4_edges, radius=FILLET4_R)

    # Sketch5 → Cut-Extrude2 (cut, up to next)
    with BuildSketch(Plane(origin=(20.7, 0, 0), x_dir=(0, 0, -1), z_dir=(1, 0, 0)), mode=Mode.PRIVATE) as cut_extrude2_sk1:
        with Locations((0, 39.75)):
            Rectangle(SKETCH5_W, SKETCH5_H)
    cut_extrude2_tool1 = extrude(cut_extrude2_sk1.sketch, amount=-CUT_EXTRUDE2_REACH, mode=Mode.PRIVATE) & part.part
    add(cut_extrude2_tool1.solids().sort_by_distance((20.7, 39.75, 0))[0], mode=Mode.SUBTRACT)

    # Sketch6 → Cut-Extrude3 (cut, through all)
    with BuildSketch(Plane.XY.offset(40.7)):
        with BuildLine():
            Line((2.25, 0), (2.25, 12))
            ThreePointArc((2.25, 12), (6.25, 16), (10.25, 12))
            Line((10.25, 12), (10.25, 0))
            ThreePointArc((10.25, 0), (6.25, -4), (2.25, 0))
        make_face()
    extrude(amount=-CUT_EXTRUDE3_DEPTH, mode=Mode.SUBTRACT)

    # Cut-Extrude4: up to this plane
    cut_extrude4_end = Plane(origin=(-13.843590902, 50, -38.7), z_dir=(0.17364817766693147, -0.9848077530122079, 0))
    # Sketch7 → Cut-Extrude4 (cut, up to the surface)
    with BuildSketch(Plane(origin=(-18.150298314, 52, 0), x_dir=(1, 0, 0), z_dir=(0, 1, 0)), mode=Mode.PRIVATE) as cut_extrude4_sk1:
        with Locations((-7.191454162, 0)):
            Rectangle(SKETCH7_W, SKETCH7_H)
    cut_extrude4_tool1 = split(extrude(cut_extrude4_sk1.sketch, amount=-CUT_EXTRUDE4_REACH, mode=Mode.PRIVATE), bisect_by=cut_extrude4_end, keep=Keep.BOTH, mode=Mode.PRIVATE)
    add(cut_extrude4_tool1.solids().sort_by_distance((-25.341752, 52, 0))[0], mode=Mode.SUBTRACT)

    # Sketch8 → Cut-Extrude5 (cut, up to next)
    with BuildSketch(Plane(origin=(0, 52, 0), x_dir=(1, 0, 0), z_dir=(0, 1, 0)), mode=Mode.PRIVATE) as cut_extrude5_sk1:
        with BuildLine():
            Line((-12.2, -36.2), (-20.2, -36.2))
            ThreePointArc((-20.2, -36.2), (-25.2, -31.2), (-20.2, -26.2))
            Line((-20.2, -26.2), (-12.2, -26.2))
            ThreePointArc((-12.2, -26.2), (-7.2, -31.2), (-12.2, -36.2))
        make_face()
    cut_extrude5_tool1 = extrude(cut_extrude5_sk1.sketch, amount=-CUT_EXTRUDE5_REACH, mode=Mode.PRIVATE) & part.part
    add(cut_extrude5_tool1.solids().sort_by_distance((-16.2, 52, 31.2))[0], mode=Mode.SUBTRACT)

    # Sketch10 → Cut-Extrude6 (cut, up to next)
    with BuildSketch(Plane(origin=(0, 0, -40.7), x_dir=(-1, 0, 0), z_dir=(0, 0, -1)), mode=Mode.PRIVATE) as cut_extrude6_sk1:
        with Locations((18.2, 34.5)):
            Rectangle(SKETCH10_W, SKETCH10_H)
    cut_extrude6_tool1 = extrude(cut_extrude6_sk1.sketch, amount=-CUT_EXTRUDE6_REACH, mode=Mode.PRIVATE) & part.part
    add(cut_extrude6_tool1.solids().sort_by_distance((-18.2, 34.5, -40.7))[0], mode=Mode.SUBTRACT)

    # Fillet5
    fillet5_edges = [part.edges().sort_by_distance(p)[0] for p in [
        (-24.7, 38.5, -39.7),
        (-24.7, 30.5, -39.7),
        (-11.7, 30.5, -39.7),
        (-11.7, 38.5, -39.7),
    ]]
    fillet(fillet5_edges, radius=FILLET5_R)


solid = part.part
